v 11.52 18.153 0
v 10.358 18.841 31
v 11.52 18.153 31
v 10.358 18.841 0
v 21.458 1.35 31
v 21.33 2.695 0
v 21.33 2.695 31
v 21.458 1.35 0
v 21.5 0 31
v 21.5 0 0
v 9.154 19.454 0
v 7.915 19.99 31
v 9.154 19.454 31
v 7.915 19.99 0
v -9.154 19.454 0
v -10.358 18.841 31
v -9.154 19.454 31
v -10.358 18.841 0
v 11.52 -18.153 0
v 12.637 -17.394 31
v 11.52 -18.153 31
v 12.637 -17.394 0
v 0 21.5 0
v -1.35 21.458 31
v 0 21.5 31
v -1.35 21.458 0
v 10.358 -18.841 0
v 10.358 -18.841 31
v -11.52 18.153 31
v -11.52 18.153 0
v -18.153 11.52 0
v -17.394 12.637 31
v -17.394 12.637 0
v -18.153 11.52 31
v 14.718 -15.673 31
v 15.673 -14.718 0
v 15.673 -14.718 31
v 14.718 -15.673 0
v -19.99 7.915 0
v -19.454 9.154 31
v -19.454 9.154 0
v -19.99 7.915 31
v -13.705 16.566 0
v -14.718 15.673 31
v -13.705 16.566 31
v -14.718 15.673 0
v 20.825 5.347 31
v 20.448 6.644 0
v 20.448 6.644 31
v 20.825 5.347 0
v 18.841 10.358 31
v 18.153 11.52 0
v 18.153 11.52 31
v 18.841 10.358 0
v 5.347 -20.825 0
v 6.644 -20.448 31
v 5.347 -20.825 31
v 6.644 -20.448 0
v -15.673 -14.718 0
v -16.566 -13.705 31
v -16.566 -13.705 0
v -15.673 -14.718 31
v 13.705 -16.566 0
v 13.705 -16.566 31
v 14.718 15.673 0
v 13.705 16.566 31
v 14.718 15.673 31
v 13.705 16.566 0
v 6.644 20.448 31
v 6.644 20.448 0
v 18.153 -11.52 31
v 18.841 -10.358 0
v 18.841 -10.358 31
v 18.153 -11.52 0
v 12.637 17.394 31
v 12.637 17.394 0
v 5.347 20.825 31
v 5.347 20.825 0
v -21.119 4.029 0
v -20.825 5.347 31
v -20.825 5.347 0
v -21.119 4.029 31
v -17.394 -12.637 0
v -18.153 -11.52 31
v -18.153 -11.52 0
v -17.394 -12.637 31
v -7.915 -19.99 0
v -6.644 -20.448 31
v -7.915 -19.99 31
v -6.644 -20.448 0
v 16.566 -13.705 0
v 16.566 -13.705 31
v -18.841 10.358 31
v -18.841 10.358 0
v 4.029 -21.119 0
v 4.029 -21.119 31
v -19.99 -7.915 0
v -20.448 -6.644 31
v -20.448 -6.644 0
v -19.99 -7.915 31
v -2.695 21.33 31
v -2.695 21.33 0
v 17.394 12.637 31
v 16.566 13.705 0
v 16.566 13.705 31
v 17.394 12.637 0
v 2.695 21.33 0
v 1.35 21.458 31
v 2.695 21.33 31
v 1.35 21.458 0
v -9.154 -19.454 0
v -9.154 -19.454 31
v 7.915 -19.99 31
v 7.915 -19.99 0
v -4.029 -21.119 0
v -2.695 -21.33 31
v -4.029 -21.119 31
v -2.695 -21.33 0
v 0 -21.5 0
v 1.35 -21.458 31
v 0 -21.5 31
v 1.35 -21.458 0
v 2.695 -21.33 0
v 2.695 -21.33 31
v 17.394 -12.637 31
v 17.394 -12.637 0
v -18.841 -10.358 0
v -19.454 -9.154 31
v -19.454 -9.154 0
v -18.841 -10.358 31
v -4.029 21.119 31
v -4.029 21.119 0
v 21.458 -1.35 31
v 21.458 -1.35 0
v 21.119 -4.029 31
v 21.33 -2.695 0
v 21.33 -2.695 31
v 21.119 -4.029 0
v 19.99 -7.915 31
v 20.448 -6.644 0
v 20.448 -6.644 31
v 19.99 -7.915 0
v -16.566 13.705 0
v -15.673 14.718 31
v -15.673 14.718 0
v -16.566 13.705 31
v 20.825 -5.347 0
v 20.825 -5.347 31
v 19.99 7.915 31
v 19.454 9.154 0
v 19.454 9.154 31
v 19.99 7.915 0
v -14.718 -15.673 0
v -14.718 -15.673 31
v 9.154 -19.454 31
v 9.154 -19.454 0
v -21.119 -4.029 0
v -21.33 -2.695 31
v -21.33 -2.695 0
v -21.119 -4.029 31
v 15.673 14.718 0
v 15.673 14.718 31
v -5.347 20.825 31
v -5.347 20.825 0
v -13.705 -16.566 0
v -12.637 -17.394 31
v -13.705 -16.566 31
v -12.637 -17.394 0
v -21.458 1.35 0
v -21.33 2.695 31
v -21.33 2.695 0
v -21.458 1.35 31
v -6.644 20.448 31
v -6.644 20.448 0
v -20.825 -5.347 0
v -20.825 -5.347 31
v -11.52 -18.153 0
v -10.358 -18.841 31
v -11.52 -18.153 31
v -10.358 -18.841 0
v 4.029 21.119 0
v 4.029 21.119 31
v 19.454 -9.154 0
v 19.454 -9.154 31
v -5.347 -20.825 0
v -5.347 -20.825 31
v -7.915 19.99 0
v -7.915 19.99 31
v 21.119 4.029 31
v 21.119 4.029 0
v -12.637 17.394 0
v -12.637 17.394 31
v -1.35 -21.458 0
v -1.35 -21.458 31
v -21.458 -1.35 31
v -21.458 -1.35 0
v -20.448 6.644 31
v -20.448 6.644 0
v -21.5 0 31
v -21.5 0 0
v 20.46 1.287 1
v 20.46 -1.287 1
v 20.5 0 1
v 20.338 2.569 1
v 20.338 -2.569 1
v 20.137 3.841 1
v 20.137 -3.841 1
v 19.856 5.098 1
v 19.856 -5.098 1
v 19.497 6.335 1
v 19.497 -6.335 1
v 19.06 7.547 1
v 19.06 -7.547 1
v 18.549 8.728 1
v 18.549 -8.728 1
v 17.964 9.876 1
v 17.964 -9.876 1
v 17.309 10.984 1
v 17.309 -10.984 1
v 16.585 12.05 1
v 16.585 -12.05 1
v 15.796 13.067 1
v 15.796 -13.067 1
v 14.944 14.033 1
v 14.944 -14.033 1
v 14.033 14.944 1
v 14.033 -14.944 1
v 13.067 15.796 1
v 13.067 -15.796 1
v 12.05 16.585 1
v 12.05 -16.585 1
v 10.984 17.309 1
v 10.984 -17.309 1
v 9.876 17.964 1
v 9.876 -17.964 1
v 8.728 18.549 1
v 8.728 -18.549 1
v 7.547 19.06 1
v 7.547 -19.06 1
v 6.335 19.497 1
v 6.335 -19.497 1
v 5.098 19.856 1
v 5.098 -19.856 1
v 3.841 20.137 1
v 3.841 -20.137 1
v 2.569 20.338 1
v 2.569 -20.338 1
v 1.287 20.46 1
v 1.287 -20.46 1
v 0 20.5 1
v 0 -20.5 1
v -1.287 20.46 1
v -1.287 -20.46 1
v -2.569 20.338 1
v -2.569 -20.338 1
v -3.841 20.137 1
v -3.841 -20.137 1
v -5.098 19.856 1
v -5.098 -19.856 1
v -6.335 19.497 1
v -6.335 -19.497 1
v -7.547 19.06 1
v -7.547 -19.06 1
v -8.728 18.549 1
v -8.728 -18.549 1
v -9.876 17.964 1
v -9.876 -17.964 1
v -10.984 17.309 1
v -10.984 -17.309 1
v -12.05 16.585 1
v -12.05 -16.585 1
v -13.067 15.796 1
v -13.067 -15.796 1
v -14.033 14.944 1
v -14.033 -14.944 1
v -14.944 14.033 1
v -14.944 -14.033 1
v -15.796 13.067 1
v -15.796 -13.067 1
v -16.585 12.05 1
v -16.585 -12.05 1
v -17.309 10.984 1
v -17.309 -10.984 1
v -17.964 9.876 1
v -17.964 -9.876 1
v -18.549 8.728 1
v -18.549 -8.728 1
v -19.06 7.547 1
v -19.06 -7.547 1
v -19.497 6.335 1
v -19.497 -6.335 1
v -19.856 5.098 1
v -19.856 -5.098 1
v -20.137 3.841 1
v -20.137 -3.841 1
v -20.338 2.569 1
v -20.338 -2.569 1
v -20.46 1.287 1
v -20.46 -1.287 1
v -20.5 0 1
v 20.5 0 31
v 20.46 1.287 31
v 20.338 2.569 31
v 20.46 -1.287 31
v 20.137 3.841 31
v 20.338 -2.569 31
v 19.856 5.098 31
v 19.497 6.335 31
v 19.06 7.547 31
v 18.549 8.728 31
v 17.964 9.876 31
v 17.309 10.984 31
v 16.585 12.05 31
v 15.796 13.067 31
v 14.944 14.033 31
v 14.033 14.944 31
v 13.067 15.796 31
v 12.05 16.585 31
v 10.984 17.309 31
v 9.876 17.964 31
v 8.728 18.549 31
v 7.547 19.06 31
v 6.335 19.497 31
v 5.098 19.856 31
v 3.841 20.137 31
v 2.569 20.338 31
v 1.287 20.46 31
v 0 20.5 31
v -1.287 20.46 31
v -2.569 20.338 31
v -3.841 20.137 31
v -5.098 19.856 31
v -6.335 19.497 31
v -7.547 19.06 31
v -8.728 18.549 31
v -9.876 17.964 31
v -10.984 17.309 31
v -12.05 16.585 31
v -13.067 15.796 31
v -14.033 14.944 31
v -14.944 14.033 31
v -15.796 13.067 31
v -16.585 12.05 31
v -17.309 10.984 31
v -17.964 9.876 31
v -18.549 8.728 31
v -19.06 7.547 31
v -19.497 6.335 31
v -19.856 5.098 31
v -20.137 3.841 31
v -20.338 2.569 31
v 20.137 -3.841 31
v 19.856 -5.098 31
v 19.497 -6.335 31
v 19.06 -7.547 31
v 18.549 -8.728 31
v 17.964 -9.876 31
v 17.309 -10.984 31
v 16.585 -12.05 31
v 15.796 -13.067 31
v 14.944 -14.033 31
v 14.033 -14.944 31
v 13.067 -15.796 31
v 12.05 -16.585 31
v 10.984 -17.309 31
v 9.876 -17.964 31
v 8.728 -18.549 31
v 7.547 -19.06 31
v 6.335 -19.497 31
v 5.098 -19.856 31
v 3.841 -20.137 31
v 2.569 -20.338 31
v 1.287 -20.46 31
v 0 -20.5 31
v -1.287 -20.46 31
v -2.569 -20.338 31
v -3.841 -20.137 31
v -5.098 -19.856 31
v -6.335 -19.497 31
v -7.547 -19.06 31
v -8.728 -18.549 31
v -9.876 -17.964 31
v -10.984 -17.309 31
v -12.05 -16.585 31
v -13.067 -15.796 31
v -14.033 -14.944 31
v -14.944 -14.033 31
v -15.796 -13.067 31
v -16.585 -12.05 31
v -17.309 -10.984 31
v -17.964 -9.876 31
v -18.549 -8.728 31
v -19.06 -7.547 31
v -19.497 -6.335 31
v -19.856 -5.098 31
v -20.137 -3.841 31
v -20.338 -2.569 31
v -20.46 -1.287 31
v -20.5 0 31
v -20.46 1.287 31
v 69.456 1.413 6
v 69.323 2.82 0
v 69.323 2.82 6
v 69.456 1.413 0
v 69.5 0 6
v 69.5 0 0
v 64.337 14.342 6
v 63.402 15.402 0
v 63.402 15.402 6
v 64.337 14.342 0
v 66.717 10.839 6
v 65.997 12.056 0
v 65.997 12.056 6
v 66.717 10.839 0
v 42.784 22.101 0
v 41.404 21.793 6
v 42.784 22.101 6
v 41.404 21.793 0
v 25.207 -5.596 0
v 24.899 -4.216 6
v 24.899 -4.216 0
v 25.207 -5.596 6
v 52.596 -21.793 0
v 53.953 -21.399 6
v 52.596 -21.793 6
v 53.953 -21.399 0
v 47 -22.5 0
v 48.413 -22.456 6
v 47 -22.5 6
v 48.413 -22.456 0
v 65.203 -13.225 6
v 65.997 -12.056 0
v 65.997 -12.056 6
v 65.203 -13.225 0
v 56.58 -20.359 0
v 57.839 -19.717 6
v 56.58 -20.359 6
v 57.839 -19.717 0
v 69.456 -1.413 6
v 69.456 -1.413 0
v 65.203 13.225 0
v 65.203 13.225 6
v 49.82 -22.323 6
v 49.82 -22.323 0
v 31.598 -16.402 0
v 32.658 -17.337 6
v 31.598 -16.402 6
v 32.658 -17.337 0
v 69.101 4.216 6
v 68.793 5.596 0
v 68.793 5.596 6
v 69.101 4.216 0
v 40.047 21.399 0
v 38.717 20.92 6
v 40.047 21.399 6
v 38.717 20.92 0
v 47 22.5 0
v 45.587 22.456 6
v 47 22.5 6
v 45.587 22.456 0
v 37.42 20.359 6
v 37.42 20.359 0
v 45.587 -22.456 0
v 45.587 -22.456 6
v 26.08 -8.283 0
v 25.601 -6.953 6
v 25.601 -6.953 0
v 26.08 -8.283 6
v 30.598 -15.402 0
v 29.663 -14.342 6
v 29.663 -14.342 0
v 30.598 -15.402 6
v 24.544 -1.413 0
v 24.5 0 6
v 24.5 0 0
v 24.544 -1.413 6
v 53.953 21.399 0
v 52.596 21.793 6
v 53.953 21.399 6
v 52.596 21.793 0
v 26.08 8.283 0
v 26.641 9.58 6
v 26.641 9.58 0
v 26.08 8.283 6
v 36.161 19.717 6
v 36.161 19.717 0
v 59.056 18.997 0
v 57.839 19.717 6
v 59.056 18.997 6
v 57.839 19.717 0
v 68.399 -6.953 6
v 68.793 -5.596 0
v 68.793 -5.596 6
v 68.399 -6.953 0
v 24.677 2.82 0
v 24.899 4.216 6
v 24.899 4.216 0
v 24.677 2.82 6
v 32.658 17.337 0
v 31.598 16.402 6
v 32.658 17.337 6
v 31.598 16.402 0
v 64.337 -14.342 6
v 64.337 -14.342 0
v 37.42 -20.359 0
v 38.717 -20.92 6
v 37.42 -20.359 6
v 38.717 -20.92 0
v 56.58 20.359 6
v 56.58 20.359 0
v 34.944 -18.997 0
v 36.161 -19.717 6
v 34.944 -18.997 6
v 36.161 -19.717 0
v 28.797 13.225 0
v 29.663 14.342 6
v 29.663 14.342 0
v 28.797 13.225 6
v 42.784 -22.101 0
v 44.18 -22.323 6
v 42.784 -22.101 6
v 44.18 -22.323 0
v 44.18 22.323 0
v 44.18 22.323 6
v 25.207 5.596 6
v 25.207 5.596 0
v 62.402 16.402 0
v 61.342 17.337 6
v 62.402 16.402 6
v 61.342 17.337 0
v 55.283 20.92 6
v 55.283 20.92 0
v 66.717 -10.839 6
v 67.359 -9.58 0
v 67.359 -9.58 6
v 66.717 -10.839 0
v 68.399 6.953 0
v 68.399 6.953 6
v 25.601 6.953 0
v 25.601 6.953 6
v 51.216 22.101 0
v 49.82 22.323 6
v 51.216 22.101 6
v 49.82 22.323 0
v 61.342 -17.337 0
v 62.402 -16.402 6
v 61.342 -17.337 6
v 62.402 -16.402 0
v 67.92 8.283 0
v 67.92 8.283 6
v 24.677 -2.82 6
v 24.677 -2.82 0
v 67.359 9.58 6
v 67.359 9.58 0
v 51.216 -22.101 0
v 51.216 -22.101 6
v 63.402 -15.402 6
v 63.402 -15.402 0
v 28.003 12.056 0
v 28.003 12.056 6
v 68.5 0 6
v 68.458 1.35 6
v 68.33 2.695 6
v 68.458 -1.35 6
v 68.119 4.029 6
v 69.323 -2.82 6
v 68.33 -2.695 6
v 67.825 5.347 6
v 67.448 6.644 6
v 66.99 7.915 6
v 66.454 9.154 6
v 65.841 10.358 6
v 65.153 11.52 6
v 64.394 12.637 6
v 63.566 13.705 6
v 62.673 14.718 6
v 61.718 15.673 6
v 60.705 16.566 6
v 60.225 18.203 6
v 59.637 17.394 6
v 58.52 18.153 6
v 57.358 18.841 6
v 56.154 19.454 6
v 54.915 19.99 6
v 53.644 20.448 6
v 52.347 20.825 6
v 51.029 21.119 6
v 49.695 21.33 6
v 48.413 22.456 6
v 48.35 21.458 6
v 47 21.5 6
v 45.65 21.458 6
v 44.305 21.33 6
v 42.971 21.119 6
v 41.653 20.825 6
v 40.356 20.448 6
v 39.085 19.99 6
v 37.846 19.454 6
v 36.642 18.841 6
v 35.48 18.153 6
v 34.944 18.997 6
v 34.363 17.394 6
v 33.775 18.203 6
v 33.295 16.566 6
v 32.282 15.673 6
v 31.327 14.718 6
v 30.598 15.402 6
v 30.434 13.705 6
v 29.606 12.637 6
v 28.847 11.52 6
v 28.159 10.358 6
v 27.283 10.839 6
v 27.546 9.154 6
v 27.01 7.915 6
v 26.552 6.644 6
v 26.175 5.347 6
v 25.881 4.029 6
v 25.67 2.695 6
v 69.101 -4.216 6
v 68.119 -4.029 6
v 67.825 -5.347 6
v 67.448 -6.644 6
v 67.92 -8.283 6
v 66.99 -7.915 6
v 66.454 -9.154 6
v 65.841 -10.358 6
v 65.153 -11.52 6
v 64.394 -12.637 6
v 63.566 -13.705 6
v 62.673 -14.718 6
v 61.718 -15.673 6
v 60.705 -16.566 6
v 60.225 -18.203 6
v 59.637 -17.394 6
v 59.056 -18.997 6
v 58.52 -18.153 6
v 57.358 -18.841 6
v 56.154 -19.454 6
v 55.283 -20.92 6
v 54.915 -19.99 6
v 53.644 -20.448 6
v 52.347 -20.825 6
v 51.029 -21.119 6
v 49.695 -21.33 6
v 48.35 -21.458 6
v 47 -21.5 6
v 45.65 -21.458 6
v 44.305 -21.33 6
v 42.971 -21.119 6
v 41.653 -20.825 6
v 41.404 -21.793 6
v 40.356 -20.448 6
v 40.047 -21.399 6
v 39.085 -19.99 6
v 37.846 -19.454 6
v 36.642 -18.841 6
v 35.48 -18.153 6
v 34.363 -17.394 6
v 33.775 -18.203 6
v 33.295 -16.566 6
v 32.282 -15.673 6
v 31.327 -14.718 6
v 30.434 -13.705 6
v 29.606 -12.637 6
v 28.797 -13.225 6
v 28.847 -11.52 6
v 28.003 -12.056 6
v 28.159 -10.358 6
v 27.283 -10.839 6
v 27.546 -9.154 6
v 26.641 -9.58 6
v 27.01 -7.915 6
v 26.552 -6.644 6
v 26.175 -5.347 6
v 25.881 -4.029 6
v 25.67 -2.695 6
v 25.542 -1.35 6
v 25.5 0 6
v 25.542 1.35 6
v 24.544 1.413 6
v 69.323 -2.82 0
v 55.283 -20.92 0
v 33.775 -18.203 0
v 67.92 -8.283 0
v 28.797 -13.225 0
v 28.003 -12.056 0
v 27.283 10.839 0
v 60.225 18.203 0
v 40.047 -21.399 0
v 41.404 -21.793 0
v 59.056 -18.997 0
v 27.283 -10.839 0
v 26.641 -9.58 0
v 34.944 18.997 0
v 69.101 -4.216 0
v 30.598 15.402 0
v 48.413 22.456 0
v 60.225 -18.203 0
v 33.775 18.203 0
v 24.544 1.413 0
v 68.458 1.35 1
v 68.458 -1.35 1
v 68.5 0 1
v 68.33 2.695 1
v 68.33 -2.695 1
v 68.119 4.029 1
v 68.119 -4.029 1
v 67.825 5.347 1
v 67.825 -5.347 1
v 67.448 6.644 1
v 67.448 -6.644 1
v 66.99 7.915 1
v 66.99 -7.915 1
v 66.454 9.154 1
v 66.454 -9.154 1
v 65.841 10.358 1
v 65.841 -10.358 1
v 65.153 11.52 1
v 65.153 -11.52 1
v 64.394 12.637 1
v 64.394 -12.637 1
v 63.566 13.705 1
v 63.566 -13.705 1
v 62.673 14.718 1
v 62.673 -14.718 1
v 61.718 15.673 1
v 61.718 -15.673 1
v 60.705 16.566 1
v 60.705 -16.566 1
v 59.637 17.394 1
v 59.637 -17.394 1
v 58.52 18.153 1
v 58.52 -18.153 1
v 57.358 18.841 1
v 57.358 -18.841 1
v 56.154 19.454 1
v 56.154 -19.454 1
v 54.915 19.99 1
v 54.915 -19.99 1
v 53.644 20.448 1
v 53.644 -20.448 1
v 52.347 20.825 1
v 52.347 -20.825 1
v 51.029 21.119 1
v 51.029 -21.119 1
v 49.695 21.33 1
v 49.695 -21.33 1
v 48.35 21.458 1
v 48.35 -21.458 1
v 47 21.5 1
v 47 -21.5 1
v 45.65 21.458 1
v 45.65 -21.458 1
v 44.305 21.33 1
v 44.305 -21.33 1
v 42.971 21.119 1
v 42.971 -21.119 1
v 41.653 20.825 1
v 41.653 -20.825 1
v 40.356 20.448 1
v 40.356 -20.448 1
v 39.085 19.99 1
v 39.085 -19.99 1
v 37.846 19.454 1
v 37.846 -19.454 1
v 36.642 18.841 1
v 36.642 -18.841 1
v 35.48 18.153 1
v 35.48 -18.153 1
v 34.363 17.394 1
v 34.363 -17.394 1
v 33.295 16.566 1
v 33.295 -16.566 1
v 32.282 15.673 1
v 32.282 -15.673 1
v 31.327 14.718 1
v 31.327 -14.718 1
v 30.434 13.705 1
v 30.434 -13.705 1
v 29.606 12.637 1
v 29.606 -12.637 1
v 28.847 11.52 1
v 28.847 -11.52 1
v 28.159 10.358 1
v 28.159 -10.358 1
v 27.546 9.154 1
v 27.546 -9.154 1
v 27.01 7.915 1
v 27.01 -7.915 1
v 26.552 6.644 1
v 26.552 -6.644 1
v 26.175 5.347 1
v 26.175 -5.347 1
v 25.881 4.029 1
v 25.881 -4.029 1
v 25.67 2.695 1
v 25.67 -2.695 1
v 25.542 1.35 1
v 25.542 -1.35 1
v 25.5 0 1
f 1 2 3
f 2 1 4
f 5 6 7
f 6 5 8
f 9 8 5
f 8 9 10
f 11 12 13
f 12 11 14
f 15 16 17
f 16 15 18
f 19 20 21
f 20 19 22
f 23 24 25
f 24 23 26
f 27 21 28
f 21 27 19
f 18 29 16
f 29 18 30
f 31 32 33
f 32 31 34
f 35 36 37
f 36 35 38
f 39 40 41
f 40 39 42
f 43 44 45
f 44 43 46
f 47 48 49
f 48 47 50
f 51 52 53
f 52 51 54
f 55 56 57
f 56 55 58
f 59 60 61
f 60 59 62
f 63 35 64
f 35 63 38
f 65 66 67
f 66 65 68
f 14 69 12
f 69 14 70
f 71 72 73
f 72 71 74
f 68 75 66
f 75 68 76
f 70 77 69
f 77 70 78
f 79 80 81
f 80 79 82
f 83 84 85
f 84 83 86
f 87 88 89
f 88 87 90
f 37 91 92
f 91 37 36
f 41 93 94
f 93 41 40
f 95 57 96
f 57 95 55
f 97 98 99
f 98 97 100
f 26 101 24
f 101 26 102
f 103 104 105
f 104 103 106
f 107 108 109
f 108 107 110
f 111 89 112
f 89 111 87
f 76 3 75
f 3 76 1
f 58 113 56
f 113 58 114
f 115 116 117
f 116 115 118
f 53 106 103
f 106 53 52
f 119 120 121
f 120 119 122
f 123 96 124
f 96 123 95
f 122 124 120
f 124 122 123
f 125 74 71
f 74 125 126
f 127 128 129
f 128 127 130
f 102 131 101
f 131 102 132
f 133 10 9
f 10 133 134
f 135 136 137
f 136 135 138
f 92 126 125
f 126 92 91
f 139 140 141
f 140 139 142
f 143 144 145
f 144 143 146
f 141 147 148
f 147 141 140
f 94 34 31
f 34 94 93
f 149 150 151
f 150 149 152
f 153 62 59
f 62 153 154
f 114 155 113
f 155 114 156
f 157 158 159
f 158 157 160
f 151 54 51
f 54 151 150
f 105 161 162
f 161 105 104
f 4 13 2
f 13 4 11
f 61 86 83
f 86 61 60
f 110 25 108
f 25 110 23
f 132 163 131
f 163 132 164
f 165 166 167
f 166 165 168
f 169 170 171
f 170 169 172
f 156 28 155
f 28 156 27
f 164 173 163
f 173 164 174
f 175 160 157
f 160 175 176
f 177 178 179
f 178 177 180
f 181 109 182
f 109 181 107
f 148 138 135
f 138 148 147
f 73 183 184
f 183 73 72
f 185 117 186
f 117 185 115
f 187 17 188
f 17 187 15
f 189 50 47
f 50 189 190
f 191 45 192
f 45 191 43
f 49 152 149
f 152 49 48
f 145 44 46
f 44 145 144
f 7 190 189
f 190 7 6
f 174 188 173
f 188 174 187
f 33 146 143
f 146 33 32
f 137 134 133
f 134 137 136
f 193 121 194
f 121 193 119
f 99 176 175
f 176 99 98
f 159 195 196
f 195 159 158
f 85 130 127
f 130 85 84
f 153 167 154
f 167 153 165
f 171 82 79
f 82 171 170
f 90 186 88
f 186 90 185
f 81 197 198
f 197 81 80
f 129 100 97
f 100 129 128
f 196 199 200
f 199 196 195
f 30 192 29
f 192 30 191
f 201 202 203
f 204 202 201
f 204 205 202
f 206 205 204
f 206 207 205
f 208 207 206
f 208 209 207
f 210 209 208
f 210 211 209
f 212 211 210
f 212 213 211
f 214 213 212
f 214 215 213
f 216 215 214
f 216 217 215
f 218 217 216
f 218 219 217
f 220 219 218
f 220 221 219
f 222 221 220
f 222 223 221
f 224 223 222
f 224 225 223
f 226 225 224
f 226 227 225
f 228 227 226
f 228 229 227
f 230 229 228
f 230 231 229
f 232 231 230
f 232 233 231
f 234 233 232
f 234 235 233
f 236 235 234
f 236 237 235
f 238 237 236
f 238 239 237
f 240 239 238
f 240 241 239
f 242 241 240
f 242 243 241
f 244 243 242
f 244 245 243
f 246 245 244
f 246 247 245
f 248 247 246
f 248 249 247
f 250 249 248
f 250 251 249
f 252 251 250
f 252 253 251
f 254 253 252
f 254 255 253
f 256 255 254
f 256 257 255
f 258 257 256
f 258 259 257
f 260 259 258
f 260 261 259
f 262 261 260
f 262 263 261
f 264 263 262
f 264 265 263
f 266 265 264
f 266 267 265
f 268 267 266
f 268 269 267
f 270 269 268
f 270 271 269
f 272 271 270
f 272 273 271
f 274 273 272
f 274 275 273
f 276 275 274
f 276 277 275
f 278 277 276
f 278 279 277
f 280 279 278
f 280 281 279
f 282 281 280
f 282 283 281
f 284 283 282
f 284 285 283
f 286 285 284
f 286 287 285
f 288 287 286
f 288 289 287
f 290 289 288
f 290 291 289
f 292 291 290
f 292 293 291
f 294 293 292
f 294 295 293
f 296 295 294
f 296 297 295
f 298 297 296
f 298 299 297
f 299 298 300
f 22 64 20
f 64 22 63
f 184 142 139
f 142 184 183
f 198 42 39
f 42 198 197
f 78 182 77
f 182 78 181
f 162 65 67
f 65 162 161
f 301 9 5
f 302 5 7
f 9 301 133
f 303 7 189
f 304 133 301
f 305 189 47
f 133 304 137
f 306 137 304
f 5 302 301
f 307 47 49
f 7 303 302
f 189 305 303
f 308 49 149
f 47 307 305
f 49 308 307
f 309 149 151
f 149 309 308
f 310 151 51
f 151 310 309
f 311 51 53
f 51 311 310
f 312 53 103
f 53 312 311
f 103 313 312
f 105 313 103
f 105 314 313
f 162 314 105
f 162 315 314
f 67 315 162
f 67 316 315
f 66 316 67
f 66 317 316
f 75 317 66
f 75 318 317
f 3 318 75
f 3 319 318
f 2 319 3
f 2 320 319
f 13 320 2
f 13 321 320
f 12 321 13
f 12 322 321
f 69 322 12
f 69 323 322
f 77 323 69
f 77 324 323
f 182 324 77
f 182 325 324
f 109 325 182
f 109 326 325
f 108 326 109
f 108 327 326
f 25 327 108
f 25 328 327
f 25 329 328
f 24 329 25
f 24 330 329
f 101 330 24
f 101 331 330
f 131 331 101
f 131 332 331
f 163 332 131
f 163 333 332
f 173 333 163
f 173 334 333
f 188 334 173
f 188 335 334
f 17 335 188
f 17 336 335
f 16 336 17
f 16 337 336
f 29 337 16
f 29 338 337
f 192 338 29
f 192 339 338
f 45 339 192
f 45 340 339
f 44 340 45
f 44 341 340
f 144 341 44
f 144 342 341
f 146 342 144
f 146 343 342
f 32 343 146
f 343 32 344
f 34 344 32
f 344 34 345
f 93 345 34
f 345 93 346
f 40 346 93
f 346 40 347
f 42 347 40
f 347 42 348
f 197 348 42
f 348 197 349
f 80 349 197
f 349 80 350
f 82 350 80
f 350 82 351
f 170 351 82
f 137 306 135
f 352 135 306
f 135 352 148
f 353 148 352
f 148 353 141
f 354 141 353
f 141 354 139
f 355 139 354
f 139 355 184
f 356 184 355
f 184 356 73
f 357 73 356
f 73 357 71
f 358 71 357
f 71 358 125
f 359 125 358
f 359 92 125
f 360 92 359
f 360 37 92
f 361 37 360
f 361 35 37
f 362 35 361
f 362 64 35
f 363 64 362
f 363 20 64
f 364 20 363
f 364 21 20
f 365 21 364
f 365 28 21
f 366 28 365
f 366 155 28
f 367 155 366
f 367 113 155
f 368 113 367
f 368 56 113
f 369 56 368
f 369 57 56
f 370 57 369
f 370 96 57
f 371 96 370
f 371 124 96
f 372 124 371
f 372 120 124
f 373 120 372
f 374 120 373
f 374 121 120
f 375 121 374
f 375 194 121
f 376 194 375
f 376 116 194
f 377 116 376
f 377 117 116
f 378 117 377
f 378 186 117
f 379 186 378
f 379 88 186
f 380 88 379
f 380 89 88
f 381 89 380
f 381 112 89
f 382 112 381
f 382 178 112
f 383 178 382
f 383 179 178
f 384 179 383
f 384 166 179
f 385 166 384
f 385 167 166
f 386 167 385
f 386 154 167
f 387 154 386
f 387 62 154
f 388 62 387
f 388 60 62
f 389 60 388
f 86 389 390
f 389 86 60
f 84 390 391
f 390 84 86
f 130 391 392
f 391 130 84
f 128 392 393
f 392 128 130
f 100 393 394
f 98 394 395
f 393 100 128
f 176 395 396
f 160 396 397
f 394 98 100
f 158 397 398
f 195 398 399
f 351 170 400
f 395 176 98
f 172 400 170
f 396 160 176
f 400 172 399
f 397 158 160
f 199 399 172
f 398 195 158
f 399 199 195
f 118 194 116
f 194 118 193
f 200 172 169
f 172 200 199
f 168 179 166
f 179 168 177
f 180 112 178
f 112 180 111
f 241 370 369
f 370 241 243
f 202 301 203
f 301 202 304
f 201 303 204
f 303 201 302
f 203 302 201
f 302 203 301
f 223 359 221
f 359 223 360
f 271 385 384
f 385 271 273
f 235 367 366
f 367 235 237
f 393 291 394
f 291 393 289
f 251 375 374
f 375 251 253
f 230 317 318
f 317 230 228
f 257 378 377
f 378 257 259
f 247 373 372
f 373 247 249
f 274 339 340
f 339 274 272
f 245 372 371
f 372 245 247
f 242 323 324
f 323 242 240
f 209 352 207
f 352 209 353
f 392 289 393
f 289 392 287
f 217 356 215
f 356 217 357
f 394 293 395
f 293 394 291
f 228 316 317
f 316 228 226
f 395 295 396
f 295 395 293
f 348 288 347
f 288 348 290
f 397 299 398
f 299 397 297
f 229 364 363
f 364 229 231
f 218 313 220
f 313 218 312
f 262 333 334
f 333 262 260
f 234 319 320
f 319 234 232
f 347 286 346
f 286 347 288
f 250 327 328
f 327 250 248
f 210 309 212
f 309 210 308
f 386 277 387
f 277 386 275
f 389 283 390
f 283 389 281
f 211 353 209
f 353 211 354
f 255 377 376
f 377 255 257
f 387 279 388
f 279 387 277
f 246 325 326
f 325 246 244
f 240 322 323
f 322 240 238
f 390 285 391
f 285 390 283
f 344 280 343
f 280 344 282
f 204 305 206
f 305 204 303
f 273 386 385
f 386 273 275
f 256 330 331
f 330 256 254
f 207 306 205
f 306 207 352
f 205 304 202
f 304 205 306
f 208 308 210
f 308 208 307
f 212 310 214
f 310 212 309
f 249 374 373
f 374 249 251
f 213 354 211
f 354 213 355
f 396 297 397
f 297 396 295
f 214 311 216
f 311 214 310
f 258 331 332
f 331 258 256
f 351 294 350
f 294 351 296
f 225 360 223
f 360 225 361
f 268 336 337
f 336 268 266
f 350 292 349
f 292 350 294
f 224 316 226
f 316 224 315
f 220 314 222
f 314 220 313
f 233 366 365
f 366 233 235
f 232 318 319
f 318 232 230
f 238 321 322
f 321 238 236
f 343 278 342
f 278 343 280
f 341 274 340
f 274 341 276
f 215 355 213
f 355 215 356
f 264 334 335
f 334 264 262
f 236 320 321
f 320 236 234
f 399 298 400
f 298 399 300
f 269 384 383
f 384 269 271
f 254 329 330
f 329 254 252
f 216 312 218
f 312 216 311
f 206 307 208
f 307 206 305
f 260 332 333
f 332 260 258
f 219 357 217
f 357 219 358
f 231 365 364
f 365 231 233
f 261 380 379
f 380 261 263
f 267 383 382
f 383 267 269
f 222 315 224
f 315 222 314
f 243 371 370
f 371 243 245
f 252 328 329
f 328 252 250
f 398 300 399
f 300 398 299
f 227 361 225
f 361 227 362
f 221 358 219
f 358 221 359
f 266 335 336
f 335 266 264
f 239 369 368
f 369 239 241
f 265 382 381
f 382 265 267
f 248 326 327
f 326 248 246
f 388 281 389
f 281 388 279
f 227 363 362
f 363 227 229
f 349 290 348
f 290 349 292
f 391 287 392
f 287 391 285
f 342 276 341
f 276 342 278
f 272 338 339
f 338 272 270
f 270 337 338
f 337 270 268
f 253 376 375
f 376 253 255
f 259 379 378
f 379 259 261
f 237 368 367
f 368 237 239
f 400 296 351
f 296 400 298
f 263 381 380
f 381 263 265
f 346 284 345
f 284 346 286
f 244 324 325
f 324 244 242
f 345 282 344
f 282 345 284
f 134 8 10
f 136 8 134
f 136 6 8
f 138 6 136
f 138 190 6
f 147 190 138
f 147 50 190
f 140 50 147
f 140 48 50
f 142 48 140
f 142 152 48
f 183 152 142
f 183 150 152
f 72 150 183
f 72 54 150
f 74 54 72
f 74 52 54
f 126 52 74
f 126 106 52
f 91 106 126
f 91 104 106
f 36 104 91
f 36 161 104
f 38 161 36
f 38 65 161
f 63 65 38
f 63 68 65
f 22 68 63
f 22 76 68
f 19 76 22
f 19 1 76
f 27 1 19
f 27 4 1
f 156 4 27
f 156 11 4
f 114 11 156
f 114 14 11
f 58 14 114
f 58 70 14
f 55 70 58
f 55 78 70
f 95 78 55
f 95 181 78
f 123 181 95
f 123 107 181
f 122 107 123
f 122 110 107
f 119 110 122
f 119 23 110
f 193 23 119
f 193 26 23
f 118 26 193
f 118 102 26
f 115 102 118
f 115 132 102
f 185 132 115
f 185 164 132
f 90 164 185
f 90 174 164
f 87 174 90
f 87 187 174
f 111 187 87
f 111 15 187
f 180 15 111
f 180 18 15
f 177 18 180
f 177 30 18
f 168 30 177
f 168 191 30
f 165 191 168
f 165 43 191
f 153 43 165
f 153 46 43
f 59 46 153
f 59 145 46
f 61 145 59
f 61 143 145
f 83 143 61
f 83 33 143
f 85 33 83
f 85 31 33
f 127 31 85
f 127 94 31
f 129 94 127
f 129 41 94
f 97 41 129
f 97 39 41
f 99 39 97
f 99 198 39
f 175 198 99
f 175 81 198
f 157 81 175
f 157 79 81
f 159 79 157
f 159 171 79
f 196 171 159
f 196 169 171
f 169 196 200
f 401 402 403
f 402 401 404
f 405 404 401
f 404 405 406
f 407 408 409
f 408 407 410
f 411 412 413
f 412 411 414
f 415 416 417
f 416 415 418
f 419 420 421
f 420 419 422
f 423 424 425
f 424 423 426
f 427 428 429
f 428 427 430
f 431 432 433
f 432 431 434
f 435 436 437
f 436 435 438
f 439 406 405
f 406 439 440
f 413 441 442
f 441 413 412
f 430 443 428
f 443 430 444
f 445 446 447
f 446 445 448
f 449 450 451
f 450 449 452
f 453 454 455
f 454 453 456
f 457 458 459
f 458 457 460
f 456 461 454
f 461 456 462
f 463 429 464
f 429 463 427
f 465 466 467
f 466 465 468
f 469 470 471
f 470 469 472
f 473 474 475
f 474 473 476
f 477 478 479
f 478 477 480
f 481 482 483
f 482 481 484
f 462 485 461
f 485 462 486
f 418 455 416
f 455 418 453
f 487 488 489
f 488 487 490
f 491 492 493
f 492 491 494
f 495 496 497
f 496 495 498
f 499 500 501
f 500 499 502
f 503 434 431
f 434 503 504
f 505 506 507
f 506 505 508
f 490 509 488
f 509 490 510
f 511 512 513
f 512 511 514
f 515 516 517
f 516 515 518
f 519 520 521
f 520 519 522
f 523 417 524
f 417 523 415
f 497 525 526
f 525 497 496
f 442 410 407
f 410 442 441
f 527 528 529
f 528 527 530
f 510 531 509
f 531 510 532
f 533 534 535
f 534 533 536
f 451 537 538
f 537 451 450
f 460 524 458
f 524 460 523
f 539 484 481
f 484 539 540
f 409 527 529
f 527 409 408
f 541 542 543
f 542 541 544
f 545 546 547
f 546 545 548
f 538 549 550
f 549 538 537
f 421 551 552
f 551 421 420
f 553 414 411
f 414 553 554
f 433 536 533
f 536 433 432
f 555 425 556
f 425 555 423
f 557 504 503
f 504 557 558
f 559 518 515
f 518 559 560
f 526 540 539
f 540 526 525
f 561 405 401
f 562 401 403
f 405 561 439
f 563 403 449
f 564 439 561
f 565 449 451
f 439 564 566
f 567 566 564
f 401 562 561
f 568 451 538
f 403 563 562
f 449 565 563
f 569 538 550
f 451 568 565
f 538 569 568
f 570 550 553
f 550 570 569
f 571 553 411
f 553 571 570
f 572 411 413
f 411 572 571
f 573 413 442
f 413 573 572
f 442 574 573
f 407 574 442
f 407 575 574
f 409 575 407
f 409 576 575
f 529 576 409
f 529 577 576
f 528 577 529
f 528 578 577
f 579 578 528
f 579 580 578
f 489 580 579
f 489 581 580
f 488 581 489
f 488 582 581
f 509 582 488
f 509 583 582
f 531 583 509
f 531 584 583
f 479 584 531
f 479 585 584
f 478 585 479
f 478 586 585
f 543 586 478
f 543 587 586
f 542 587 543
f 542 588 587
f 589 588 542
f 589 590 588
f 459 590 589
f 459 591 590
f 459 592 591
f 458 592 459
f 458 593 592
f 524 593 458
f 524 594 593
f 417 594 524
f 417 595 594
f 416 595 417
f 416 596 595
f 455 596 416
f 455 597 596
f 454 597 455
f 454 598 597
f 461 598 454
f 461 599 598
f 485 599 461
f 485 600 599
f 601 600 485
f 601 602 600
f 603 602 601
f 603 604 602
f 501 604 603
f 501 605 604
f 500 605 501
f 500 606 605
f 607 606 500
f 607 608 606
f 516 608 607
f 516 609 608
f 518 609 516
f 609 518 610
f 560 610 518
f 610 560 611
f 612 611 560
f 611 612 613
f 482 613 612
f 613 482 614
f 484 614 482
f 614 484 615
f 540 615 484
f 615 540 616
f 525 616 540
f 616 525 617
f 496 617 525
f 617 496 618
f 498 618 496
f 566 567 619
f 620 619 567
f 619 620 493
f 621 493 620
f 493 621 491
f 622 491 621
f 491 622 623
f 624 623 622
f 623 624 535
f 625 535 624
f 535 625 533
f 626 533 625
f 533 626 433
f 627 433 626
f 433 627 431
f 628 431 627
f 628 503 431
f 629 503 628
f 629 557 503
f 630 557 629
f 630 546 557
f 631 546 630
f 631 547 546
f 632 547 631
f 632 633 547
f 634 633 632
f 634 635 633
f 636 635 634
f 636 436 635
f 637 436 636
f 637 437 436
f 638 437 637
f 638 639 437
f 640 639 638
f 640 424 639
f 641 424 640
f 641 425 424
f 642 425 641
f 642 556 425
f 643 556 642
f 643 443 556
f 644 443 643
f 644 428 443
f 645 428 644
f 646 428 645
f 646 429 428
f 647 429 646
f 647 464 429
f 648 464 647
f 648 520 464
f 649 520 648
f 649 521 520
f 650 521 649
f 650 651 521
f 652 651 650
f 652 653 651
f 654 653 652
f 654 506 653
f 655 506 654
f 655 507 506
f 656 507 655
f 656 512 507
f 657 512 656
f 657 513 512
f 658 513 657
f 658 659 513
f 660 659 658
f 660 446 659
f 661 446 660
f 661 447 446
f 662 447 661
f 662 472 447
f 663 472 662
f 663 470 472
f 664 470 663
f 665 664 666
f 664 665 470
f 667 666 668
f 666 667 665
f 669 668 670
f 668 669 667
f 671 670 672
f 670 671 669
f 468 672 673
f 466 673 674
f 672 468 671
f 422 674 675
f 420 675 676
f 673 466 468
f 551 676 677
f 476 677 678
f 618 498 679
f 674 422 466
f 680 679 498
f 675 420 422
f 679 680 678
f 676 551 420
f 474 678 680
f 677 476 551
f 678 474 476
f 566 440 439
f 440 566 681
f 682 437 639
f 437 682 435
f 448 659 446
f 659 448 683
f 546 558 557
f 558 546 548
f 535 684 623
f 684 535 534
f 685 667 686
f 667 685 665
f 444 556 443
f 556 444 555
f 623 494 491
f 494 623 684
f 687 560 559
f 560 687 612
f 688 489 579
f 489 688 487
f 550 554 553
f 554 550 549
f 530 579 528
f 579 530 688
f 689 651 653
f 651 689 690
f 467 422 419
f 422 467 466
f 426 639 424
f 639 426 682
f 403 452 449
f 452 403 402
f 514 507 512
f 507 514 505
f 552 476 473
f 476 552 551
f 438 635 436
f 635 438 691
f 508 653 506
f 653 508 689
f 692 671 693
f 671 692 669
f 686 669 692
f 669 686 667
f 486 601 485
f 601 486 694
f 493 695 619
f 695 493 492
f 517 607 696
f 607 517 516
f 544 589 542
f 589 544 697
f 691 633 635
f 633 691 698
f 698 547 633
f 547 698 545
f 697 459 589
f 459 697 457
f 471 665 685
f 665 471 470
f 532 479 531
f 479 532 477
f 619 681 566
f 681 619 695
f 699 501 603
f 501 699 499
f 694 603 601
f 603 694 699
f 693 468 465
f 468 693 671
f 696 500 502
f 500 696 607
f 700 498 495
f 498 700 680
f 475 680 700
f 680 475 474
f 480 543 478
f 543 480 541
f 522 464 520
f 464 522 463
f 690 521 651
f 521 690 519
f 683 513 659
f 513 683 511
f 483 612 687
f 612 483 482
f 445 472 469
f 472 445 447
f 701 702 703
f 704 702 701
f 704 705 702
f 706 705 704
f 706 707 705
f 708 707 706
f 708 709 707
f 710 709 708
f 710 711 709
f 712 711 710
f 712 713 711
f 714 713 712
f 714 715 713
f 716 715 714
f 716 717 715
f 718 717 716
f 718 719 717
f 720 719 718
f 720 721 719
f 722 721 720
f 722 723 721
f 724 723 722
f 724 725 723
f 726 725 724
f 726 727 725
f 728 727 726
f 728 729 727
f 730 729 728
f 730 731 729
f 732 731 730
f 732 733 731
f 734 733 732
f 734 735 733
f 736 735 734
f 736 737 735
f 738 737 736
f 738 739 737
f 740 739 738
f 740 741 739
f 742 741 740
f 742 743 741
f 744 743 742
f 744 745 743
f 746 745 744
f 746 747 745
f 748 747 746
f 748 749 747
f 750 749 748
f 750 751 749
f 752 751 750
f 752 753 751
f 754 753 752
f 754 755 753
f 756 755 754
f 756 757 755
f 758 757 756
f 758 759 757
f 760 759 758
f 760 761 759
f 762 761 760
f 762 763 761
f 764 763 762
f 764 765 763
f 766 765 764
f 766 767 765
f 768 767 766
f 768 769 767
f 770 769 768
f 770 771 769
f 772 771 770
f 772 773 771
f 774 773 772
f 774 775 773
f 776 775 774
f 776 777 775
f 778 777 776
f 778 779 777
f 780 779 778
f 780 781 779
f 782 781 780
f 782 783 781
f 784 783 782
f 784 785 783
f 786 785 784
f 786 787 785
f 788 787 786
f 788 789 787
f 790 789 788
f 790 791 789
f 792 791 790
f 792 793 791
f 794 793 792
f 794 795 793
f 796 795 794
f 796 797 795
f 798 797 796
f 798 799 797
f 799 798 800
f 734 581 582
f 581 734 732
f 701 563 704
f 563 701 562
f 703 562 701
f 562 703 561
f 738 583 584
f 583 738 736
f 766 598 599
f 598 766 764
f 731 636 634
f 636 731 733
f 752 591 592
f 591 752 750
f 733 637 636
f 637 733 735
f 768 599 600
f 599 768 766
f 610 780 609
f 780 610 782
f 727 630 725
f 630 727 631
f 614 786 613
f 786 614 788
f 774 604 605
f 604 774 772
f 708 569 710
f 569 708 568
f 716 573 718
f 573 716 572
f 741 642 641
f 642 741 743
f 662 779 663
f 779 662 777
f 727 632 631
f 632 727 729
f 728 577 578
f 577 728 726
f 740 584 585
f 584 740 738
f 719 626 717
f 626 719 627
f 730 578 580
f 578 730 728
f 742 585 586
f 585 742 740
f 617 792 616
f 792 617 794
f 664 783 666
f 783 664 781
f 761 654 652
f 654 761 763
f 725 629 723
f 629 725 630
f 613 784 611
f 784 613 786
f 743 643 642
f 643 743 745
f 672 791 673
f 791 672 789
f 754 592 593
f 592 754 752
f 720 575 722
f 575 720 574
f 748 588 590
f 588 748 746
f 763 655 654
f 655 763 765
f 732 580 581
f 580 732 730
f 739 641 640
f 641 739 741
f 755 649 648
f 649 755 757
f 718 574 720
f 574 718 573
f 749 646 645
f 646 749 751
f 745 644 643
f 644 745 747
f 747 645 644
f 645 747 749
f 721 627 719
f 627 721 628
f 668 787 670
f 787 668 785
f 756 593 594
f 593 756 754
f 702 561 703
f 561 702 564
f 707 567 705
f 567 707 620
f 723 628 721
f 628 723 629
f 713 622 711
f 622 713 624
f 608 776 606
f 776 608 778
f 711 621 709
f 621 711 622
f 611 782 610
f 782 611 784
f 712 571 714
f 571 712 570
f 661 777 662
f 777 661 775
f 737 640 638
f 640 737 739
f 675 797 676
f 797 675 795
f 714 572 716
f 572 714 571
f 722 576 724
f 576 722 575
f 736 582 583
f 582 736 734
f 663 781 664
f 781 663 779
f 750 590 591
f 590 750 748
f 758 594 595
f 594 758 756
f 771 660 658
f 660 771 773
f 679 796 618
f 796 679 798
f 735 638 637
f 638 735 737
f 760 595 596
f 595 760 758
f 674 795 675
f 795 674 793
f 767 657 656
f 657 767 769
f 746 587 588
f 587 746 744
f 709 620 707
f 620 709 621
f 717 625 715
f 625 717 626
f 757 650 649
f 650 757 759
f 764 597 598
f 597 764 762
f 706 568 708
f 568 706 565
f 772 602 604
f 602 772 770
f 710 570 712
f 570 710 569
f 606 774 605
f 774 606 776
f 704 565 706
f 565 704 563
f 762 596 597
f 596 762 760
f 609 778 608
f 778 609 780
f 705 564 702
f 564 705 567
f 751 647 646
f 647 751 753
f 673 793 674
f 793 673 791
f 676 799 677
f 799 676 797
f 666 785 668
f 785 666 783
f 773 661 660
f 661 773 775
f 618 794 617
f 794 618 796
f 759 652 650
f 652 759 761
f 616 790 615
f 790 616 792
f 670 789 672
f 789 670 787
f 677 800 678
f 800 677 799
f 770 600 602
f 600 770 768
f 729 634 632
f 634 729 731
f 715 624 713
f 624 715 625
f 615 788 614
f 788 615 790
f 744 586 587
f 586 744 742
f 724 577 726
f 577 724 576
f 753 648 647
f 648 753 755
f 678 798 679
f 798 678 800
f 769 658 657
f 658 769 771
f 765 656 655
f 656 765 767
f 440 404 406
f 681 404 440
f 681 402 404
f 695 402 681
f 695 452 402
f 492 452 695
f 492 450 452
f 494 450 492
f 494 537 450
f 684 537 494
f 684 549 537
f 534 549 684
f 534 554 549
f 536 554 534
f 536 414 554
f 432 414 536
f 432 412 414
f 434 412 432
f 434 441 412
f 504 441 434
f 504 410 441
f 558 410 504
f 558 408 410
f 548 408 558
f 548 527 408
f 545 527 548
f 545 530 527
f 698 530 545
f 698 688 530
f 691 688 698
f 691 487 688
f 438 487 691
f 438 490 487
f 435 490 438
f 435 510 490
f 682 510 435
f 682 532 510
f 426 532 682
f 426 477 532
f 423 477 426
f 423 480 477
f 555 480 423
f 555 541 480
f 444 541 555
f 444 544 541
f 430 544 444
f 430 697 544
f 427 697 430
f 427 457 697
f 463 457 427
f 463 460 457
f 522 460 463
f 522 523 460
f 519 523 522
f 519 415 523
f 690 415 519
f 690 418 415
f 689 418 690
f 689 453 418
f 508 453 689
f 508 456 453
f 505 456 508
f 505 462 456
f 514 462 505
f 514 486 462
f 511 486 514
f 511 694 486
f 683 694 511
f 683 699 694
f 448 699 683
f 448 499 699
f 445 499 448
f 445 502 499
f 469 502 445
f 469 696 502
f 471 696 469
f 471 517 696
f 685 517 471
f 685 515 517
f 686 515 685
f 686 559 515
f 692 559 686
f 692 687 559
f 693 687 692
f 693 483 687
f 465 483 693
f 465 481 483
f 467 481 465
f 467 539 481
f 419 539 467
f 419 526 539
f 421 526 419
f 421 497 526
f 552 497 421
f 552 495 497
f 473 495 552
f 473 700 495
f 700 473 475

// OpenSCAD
/*  
**  Name:  Customizable Coin Container_3d_model
**  Author:  Chris Benson  @TheExtruder
**  Created:  2/24/2017
*/
part = "both" ; // [first:Container Only,second:Cap Only,both:Container and Cap]

numberOfCoins = 10; //[1:1:100]

//in millimeters
coinHeight = 3;
//in millimeters
coinDiameter = 41;
//in millimeters.  The final height will this value + the wall thickness.
capHeight = 5;

wallThickness = 1;

/* [Hidden] */
$fn = 100;

print_part();

module print_part() {
	if (part == "first") {
		//container
        CreateContainer();
	} else if (part == "second") {
		//cap
        CreateCap();
	} else if (part == "both") {
		CreateContainerAndCap();
	} else {
		CreateContainerAndCap();
	}
}

module CreateContainer(){
    CreateCylinder(numberOfCoins * coinHeight, coinDiameter, wallThickness);
}

module CreateCap(){
    CreateCylinder(capHeight, coinDiameter + wallThickness * 2, wallThickness);
}

module CreateContainerAndCap(){
    CreateContainer();
    translate([coinDiameter + wallThickness + 5,0,0])
        CreateCap();
}

module CreateCylinder(height,innerDiameter,wallThinkness){
    union(){
        //bottom
        cylinder(wallThickness, d=innerDiameter + (wallThickness * 2), true);
        
        translate([0,0,wallThickness]){
            difference(){
                //outer wall
                cylinder(height, d=innerDiameter + (wallThickness * 2), true);
                //inner wall
                cylinder(height, d=innerDiameter, true);
            }
        }
    }
}
